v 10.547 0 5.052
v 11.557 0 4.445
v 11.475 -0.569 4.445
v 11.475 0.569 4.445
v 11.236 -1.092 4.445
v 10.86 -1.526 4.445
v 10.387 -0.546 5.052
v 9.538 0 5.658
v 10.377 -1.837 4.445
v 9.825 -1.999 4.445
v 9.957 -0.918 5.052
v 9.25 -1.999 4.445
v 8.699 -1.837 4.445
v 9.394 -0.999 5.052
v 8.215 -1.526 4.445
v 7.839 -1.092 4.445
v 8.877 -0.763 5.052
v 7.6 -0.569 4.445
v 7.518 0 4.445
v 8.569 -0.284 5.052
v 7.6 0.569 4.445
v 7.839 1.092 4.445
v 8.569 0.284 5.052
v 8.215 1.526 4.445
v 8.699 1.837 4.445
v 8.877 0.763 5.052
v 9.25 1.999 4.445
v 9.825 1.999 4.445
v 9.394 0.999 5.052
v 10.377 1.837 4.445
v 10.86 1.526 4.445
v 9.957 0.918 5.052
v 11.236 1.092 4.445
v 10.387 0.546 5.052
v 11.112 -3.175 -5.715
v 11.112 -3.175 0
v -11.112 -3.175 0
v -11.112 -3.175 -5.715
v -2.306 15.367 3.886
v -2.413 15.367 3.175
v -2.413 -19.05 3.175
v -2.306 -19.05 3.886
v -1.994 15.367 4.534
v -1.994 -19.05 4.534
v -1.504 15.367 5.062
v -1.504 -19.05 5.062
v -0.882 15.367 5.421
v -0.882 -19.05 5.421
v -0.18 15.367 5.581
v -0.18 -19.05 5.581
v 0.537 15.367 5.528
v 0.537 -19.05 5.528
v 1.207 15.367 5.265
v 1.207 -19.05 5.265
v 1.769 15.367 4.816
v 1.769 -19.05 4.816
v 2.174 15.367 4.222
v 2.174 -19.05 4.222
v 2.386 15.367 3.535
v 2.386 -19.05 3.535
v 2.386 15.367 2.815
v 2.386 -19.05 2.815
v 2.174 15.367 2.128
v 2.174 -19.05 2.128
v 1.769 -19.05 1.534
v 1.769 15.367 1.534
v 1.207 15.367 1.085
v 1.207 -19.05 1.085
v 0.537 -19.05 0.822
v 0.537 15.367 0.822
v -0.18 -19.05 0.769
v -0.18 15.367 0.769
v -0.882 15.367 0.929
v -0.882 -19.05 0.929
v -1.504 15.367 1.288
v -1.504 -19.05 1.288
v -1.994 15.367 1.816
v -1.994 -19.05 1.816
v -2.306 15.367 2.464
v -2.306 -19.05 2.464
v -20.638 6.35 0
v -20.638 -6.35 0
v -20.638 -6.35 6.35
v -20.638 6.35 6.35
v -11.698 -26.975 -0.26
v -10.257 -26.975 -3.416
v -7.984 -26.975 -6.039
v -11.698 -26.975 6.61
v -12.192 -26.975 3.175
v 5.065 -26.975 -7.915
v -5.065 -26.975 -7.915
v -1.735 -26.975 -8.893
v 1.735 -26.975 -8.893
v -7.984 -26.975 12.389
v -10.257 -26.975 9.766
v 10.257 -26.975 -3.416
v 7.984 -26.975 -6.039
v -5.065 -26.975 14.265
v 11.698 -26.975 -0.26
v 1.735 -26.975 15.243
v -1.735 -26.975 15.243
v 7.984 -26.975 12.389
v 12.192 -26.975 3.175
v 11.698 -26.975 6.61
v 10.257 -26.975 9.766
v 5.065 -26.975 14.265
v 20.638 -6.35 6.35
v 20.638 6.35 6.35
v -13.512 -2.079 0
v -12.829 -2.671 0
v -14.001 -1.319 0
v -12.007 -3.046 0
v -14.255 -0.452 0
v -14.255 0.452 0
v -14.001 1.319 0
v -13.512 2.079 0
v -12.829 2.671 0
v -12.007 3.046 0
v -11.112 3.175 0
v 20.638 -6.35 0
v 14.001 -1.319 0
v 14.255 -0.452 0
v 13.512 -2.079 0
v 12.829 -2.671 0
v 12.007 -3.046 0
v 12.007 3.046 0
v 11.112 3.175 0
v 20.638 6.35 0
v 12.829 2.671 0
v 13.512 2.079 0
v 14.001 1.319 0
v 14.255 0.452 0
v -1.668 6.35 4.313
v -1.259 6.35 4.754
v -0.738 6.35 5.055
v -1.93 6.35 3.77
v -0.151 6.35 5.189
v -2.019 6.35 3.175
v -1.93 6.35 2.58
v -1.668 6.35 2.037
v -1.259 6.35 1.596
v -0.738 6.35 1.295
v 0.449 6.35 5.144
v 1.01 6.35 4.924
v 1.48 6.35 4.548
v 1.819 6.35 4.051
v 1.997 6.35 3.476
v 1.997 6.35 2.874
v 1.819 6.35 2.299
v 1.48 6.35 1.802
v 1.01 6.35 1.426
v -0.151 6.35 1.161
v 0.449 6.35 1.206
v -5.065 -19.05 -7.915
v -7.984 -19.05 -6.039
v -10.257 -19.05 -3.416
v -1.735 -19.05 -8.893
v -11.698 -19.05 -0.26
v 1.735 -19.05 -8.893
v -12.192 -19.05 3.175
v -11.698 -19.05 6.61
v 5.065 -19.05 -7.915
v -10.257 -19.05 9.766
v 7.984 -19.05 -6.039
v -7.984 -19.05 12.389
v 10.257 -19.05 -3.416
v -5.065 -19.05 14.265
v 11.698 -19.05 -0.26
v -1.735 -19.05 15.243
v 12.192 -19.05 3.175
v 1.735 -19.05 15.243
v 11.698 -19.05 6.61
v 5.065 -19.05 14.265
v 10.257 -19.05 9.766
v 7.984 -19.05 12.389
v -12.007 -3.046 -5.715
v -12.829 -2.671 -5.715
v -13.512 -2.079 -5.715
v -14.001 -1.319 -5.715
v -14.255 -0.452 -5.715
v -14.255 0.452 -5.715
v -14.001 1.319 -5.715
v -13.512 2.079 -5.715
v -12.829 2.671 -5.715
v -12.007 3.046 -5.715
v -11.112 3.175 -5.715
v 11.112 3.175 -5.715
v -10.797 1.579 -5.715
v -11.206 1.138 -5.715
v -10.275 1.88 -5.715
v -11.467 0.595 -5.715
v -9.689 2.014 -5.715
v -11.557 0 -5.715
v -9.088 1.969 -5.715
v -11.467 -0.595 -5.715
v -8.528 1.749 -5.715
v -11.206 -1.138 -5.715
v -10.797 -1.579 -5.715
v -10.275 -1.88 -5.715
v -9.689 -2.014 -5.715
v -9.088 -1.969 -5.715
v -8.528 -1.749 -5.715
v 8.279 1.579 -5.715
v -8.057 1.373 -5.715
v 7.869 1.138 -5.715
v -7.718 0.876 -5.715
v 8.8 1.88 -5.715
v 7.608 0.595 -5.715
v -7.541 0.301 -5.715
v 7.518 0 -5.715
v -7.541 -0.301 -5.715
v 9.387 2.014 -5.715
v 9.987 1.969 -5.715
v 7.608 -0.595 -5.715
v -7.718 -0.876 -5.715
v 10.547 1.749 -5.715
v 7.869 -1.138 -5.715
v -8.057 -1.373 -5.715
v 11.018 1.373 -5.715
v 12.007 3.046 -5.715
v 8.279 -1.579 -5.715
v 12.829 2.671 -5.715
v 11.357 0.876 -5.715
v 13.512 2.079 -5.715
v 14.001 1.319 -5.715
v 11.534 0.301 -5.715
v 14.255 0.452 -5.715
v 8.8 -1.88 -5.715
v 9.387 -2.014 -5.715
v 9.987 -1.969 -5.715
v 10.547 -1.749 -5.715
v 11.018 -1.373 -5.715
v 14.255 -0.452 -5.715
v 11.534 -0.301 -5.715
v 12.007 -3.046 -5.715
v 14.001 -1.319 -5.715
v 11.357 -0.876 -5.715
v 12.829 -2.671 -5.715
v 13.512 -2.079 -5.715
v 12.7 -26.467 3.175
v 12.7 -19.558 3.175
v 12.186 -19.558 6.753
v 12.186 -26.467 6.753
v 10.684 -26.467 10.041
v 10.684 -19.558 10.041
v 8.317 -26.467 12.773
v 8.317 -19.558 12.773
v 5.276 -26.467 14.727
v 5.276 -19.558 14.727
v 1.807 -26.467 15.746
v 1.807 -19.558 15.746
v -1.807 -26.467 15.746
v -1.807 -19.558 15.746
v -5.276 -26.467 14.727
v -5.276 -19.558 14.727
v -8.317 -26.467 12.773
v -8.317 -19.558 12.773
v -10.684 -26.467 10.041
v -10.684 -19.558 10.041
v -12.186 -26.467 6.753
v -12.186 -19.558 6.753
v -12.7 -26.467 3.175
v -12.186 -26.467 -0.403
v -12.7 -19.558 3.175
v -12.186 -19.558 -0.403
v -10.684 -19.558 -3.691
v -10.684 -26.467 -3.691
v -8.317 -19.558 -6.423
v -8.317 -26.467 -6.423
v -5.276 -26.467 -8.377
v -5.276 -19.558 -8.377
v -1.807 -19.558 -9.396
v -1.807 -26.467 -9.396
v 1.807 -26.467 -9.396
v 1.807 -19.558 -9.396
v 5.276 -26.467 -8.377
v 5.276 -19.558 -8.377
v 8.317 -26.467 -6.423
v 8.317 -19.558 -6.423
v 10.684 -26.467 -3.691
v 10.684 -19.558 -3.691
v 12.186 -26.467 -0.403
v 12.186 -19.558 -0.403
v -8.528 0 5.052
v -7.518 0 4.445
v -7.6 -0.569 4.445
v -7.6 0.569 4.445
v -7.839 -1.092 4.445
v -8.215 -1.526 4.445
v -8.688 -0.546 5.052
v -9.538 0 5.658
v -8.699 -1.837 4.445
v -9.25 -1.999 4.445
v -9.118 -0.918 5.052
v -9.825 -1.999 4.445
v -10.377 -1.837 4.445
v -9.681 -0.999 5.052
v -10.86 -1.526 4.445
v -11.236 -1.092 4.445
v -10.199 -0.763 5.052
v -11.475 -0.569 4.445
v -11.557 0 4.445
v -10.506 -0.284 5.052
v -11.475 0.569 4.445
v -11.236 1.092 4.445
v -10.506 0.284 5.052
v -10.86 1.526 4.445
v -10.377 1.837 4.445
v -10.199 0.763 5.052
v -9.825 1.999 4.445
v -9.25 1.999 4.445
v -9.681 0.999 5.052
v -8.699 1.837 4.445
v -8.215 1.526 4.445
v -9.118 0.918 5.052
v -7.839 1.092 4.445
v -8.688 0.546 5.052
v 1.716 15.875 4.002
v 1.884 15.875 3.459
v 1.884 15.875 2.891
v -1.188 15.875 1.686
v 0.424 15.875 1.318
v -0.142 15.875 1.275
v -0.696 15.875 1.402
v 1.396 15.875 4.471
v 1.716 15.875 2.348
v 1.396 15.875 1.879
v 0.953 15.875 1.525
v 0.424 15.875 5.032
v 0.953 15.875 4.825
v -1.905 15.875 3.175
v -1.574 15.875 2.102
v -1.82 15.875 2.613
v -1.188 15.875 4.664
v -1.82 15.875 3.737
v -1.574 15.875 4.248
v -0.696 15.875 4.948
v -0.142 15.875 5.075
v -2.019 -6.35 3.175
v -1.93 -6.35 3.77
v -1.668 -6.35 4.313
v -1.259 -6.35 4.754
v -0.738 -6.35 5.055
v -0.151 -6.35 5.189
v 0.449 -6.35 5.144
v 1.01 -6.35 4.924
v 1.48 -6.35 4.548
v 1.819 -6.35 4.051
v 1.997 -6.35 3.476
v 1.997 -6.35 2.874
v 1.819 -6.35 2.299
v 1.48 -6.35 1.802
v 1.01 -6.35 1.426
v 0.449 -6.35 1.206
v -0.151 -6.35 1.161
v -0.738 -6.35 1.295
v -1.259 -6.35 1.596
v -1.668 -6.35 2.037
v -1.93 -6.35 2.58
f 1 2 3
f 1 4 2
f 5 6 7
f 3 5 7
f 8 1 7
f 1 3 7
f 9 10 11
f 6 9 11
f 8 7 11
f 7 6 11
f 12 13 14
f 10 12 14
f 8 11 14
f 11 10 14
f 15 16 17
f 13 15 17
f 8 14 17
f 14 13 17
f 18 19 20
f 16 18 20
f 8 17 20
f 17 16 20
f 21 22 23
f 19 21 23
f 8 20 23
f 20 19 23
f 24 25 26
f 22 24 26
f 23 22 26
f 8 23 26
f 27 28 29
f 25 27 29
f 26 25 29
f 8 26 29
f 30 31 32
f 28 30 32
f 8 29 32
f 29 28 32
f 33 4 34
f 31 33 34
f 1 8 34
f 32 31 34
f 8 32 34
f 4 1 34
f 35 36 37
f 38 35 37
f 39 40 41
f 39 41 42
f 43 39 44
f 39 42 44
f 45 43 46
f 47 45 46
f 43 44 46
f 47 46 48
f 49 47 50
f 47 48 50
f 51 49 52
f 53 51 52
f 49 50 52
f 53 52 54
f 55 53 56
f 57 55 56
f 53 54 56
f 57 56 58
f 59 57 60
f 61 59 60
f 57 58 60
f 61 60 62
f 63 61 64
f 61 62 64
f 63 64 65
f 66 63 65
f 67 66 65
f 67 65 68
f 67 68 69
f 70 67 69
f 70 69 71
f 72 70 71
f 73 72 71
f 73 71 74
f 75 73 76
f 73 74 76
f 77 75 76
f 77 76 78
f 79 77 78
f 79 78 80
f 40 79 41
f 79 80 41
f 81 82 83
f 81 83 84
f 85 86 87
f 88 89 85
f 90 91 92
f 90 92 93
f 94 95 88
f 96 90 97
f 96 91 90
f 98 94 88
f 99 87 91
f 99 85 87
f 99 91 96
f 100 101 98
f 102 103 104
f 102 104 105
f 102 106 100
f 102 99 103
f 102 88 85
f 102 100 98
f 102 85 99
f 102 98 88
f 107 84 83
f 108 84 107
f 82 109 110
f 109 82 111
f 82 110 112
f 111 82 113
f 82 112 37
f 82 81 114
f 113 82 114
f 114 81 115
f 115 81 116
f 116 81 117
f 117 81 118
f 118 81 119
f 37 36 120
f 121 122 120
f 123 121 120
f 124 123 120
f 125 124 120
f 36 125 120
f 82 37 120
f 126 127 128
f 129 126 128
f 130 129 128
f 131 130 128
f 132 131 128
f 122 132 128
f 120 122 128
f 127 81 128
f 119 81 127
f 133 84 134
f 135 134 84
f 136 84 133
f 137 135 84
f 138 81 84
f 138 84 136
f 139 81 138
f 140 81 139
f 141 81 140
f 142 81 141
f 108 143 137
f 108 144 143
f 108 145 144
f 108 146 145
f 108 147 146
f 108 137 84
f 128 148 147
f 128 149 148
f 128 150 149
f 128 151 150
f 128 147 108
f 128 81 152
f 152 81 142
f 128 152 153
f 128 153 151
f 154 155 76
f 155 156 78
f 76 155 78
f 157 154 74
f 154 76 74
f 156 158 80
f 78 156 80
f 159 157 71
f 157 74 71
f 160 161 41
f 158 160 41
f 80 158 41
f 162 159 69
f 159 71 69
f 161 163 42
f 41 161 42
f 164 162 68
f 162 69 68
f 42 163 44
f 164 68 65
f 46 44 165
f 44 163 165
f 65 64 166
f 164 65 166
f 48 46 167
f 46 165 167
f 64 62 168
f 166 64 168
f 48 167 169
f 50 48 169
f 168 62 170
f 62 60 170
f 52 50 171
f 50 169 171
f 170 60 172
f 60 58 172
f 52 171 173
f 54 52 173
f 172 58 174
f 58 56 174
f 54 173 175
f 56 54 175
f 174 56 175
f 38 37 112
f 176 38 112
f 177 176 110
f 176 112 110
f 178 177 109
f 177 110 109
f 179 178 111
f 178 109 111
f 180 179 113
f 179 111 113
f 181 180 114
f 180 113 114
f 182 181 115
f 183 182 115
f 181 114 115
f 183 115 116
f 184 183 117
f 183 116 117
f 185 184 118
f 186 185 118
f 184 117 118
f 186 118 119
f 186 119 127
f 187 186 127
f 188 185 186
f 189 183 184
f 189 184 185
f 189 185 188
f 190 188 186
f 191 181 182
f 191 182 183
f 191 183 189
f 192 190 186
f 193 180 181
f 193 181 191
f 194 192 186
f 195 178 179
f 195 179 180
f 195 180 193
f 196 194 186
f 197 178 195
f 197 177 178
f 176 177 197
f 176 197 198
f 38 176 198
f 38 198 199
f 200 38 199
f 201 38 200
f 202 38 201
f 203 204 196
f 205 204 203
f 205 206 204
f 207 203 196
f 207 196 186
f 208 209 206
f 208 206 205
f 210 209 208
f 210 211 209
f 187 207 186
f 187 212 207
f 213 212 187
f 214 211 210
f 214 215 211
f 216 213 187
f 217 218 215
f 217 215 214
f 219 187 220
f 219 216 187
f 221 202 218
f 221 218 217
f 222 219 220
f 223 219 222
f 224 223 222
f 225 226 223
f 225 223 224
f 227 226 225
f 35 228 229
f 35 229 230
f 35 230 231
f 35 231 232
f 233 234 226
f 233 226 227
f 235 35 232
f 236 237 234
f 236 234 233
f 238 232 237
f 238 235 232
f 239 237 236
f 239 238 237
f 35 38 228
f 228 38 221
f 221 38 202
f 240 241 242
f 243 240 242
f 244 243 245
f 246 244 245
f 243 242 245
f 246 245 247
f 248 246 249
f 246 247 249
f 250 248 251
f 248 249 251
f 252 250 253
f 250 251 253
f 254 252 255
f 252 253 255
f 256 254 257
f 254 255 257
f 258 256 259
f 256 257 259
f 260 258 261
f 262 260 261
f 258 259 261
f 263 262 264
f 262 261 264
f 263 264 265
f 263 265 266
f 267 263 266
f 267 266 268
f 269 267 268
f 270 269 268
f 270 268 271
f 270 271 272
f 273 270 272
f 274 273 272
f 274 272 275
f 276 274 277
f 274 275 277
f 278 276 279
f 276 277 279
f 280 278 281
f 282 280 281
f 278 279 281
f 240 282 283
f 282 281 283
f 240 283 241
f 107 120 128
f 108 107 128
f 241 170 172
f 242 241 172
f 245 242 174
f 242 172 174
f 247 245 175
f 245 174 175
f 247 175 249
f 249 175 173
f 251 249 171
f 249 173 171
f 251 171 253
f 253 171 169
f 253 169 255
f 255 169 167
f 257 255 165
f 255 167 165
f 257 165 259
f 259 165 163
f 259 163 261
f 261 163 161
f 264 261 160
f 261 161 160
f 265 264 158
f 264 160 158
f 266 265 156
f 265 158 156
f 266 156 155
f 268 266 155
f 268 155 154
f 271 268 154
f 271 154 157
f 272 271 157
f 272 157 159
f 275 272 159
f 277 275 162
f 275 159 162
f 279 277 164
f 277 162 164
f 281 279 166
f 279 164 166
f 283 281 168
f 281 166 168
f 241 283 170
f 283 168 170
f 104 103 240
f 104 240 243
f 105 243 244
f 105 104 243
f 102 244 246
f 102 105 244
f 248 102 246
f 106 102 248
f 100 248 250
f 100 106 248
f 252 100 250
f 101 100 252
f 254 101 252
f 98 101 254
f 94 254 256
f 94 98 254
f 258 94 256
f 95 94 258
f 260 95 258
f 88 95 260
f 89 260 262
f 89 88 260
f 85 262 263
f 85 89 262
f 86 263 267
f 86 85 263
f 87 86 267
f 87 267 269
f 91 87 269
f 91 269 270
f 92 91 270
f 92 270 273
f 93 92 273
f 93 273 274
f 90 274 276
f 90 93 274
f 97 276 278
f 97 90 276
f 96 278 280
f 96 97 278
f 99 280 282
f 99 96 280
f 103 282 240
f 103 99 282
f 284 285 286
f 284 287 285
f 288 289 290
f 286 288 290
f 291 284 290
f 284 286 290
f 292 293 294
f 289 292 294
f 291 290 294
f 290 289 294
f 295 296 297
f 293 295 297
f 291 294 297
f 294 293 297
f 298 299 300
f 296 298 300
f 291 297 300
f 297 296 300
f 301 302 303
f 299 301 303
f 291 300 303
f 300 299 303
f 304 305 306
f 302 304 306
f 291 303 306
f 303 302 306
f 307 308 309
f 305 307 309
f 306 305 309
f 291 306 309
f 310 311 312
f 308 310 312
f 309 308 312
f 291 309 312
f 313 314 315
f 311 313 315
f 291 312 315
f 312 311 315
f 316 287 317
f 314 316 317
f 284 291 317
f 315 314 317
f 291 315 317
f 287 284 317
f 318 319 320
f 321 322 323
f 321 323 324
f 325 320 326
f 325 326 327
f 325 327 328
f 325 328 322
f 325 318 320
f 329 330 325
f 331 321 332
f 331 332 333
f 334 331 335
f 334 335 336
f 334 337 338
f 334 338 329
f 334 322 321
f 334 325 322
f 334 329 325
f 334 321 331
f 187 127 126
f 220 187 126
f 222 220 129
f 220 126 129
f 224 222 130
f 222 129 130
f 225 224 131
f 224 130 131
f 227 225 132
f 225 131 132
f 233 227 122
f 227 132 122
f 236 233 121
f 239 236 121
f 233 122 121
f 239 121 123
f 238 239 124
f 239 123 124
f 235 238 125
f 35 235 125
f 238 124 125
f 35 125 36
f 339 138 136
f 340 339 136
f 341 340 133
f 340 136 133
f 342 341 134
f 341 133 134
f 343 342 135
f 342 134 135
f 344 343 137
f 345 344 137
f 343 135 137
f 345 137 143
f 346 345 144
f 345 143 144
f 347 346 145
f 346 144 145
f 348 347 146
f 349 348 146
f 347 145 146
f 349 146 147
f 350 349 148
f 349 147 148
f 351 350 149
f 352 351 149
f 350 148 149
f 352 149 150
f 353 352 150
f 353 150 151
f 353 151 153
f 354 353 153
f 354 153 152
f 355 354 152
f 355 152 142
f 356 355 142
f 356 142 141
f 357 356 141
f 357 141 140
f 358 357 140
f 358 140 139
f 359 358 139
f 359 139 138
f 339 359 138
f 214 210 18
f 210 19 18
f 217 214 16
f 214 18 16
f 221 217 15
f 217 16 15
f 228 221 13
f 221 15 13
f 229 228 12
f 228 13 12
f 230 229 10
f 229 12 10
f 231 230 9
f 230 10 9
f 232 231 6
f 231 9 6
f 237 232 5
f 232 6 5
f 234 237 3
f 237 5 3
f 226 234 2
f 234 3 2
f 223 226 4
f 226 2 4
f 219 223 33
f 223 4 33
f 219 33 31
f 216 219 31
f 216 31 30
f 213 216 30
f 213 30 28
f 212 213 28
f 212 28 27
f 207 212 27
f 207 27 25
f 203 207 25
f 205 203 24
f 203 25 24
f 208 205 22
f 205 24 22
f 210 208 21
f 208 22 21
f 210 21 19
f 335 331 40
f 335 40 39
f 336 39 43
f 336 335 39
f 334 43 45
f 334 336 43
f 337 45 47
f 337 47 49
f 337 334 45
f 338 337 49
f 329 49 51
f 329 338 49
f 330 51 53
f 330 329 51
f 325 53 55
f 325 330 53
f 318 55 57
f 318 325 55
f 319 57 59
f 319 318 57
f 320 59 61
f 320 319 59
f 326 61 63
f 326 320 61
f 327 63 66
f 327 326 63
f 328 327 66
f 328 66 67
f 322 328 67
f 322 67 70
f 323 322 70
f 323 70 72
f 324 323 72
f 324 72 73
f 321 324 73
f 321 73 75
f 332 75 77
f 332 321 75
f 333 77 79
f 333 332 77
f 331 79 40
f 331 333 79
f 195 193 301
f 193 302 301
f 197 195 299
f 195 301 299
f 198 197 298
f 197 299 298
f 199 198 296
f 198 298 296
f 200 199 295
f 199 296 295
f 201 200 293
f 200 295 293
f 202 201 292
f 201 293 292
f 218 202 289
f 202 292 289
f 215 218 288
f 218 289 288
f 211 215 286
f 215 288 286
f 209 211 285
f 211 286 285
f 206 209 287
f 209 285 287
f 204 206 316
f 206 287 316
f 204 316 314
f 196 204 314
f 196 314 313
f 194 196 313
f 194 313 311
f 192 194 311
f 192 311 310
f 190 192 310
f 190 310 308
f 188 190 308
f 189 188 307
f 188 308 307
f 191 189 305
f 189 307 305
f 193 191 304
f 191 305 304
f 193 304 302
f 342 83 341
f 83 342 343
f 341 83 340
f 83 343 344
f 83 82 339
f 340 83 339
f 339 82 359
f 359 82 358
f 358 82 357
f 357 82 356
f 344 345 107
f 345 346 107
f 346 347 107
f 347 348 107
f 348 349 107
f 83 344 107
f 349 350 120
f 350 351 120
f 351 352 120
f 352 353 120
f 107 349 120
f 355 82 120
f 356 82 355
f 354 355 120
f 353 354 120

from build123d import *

# Parameters (mm, degrees)
F0_W      = 41.275
F0_H      = 12.7
F1_DEPTH  = 6.35
F3_DEPTH  = 5.715
F5_D      = 4.0386
F5_DEPTH  = 10.16
F5_TIP    = 1.213317848
F7_D      = 4.0386
F9_R      = 12.7
F10_DEPTH = 7.9248
F11_R     = 2.413
F12_DEPTH = 34.925
F13_SIZE  = 0.508


with BuildPart() as f1:
    # F0 (on Top) → F1 (new body)
    with BuildSketch(Plane.XY):
        Rectangle(F0_W, F0_H)
    extrude(amount=F1_DEPTH)

    # F2 (on face) → F3 (join)
    with BuildSketch(Plane(origin=(0, 0, 0), x_dir=(1, 0, 0), z_dir=(0, 0, -1))):
        with BuildLine():
            ThreePointArc((-11.1125, 3.175), (-14.2875, 0), (-11.1125, -3.175))
            Line((-11.1125, -3.175), (11.1125, -3.175))
            ThreePointArc((11.1125, -3.175), (14.2875, 0), (11.1125, 3.175))
            Line((11.1125, 3.175), (-11.1125, 3.175))
        make_face()
    extrude(amount=F3_DEPTH)

    # F5
    with Locations(Plane(origin=(0, 0, -5.715), x_dir=(1, 0, 0), z_dir=(0, 0, -1))):
        with Locations((-9.5377, 0), (9.5377, 0)):
            Hole(F5_D / 2, depth=F5_DEPTH)
            with Locations((0, 0, -(F5_DEPTH + F5_TIP / 2))):  # 118° drill point
                Cone(0, F5_D / 2, F5_TIP, mode=Mode.SUBTRACT)

    # F7 (through all)
    with Locations(Plane.XZ.offset(6.35)):
        with Locations((0, 3.175)):
            Hole(F7_D / 2)


with BuildPart() as f10:
    # F9 (on offset) → F10 (new body)
    with BuildSketch(Plane.XZ.offset(19.05)):
        with Locations((0, 3.175)):
            Circle(F9_R)
    extrude(amount=F10_DEPTH)

    # F11 (on face) → F12 (join)
    with BuildSketch(Plane(origin=(0, -19.05, 0), x_dir=(-1, 0, 0), z_dir=(0, 1, 0))):
        with Locations((0, 3.175)):
            Circle(F11_R)
    extrude(amount=F12_DEPTH)

    # F13
    f13_edges = [f10.edges().sort_by_distance(p)[0] for p in [
        (-12.7, -26.9748, 3.175),
        (-12.7, -19.05, 3.175),
        (2.413, 15.875, 3.175),
    ]]
    chamfer(f13_edges, length=F13_SIZE)


solid = Compound([f1.part, f10.part])
